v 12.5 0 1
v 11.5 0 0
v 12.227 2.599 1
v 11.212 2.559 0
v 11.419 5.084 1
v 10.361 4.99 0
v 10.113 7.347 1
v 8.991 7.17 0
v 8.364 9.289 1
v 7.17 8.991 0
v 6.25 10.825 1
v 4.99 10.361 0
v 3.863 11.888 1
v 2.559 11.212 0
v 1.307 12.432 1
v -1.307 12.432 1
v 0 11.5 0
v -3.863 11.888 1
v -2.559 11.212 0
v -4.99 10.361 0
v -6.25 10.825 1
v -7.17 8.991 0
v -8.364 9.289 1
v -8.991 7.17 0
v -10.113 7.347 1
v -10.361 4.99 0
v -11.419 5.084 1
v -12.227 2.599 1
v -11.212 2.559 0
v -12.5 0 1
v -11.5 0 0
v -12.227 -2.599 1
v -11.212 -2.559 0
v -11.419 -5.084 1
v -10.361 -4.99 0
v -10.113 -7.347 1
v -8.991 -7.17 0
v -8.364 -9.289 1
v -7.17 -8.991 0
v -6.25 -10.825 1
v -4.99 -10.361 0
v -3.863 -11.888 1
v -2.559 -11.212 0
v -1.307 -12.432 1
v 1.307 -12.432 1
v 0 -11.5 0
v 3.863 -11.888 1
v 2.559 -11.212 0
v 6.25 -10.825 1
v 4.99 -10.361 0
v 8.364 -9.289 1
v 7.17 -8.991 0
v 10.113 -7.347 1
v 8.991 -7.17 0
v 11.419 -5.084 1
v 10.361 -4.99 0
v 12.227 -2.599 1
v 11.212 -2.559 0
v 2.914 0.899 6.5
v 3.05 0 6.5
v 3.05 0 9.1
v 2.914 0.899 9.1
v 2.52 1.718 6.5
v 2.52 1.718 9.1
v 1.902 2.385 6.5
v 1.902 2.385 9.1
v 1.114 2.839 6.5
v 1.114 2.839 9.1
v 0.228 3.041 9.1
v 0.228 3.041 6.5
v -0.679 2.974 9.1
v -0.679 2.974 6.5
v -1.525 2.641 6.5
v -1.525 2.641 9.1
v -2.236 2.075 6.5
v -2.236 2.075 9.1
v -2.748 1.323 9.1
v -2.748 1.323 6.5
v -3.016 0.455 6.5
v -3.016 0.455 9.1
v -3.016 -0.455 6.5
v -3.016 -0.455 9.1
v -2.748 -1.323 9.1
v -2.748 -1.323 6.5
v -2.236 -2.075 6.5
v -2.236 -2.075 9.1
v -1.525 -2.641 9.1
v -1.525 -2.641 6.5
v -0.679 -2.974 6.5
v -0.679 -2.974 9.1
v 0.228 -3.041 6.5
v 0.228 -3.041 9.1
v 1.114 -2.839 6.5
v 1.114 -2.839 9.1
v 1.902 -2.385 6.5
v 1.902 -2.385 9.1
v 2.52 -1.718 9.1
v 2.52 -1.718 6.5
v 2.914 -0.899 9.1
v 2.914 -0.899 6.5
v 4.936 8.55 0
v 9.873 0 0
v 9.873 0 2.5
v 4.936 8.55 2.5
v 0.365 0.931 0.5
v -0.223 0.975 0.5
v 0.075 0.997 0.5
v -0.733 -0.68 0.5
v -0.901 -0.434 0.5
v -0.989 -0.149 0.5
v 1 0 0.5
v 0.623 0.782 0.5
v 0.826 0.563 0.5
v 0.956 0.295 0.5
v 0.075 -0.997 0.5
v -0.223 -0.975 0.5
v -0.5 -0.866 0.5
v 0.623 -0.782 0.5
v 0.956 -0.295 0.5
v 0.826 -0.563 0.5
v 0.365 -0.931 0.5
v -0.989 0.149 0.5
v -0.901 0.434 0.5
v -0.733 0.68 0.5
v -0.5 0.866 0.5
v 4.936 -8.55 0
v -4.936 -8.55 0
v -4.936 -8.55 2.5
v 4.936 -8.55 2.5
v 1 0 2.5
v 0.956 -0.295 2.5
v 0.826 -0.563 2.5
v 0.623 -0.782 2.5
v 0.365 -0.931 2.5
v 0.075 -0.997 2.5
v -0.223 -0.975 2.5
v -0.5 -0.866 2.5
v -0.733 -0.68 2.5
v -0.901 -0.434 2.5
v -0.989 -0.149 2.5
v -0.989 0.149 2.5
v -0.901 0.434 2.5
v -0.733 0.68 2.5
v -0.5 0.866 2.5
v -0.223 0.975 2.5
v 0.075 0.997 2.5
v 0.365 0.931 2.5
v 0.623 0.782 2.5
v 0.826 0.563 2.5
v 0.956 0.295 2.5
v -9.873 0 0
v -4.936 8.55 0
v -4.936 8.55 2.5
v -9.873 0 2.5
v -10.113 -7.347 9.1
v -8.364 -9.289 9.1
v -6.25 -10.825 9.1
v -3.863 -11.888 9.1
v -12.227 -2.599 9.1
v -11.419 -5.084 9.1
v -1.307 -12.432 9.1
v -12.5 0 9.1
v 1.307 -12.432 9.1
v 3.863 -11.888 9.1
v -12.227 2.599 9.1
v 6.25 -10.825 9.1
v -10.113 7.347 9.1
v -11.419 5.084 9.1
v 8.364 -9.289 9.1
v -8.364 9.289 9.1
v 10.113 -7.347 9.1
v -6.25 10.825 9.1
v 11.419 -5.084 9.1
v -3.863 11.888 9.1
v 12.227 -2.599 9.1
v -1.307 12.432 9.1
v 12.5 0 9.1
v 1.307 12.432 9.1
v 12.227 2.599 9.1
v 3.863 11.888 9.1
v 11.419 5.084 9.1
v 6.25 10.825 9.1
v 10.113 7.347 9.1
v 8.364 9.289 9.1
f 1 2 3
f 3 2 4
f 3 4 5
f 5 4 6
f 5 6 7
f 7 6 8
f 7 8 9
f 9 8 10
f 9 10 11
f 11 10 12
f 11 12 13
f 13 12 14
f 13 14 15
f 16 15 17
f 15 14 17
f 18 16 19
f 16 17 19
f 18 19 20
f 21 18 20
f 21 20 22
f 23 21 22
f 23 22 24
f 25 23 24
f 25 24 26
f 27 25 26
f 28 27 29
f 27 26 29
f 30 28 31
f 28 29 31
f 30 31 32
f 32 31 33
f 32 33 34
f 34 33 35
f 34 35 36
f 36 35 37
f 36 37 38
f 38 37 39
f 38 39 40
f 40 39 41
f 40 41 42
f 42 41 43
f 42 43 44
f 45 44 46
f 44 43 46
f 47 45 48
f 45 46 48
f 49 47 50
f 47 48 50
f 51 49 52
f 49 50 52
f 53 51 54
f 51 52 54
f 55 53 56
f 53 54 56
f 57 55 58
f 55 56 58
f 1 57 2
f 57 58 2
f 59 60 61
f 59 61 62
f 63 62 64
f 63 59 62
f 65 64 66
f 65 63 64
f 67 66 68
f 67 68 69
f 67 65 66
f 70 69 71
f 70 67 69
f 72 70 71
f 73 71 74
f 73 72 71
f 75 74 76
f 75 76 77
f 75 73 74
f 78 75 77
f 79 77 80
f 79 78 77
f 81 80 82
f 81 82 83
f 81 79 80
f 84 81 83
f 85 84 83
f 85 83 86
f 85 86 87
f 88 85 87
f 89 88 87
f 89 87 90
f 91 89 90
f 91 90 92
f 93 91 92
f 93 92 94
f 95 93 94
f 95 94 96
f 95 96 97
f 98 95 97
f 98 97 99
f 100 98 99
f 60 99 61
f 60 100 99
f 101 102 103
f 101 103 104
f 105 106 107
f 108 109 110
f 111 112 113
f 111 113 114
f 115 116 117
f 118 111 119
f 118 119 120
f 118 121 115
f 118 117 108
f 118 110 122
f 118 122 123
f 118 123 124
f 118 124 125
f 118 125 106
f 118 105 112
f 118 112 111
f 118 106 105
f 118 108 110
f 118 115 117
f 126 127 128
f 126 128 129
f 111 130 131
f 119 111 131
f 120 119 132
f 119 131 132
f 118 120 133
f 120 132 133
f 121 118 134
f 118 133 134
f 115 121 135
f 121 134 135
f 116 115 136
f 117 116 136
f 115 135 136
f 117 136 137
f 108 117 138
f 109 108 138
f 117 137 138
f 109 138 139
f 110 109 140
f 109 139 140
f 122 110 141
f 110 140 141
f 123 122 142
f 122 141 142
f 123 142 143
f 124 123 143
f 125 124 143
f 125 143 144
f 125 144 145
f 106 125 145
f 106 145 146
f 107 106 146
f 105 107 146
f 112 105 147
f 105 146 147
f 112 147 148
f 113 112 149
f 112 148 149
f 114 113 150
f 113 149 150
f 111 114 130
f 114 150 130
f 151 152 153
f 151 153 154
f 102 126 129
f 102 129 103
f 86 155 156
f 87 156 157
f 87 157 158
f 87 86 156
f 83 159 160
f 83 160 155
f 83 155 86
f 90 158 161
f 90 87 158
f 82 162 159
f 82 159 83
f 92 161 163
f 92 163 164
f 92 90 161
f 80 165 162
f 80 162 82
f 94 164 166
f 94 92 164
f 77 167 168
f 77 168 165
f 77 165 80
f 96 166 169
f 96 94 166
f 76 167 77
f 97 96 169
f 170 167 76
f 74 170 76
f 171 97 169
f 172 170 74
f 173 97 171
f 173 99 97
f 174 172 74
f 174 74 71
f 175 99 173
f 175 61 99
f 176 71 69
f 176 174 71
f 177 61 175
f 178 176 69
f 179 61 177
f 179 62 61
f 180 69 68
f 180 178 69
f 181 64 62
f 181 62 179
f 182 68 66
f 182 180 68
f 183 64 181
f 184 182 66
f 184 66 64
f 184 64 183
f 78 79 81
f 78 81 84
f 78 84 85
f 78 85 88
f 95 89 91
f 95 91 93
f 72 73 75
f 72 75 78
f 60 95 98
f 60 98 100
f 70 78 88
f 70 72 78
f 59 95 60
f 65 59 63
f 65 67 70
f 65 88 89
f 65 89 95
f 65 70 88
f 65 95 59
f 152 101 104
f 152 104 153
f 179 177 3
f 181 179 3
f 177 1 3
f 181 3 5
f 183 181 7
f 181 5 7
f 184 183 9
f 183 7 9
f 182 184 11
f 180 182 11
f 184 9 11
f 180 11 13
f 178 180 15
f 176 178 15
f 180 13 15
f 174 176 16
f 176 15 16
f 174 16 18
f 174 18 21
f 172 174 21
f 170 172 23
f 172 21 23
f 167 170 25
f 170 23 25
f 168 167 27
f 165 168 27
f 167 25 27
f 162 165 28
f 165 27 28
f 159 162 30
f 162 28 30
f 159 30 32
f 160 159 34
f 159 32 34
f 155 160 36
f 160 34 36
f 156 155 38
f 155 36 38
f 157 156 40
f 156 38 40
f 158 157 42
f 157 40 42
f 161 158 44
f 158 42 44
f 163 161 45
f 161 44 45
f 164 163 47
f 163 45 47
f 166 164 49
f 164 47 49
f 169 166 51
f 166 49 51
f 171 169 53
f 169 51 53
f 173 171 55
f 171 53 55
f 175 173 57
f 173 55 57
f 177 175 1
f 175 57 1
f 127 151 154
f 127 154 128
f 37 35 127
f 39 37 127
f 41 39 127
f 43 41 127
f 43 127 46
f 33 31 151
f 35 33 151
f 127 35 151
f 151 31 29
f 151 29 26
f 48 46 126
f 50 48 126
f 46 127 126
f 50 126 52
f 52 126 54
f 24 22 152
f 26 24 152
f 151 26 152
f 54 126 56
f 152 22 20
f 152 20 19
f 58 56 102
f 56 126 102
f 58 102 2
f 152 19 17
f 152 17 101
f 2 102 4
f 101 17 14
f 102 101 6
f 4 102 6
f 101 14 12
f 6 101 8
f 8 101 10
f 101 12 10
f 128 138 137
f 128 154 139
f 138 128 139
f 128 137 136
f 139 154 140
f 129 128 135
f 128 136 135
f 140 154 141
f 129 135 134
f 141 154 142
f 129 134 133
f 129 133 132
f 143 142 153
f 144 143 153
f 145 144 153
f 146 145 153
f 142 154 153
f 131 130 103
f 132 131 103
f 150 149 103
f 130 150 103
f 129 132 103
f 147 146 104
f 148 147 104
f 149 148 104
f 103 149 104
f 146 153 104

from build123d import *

# Parameters (mm, degrees)
ESQUISSE1_R        = 12.5
BOSS_EXTRU_1_DEPTH = 2.5
ESQUISSE2_R        = 12.5
BOSS_EXTRU_2_DEPTH = 4
ESQUISSE3_R        = 1
BOSS_EXTRU_3_DEPTH = 2
CHANFREIN1_SIZE    = 1
ESQUISSE4_R        = 12.5
ESQUISSE4_R_2      = 3.05
BOSS_EXTRU_4_DEPTH = 2.6


with BuildPart() as part:
    # Esquisse1 → Boss.-Extru.1 (new body)
    with BuildSketch(Plane.XY):
        Circle(ESQUISSE1_R)
        Polygon((-4.936344802, -8.55), (4.936344802, -8.55), (9.872689603, 0), (4.936344802, 8.55), (-4.936344802, 8.55), (-9.872689603, 0), align=None, mode=Mode.SUBTRACT)
    extrude(amount=BOSS_EXTRU_1_DEPTH)

    # Esquisse2 → Boss.-Extru.2 (add)
    with BuildSketch(Plane.XY.offset(2.5)):
        Circle(ESQUISSE2_R)
    extrude(amount=BOSS_EXTRU_2_DEPTH)

    # Esquisse3 → Boss.-Extru.3 (add)
    with BuildSketch(Plane(origin=(0, 0, 2.5), x_dir=(-1, 0, 0), z_dir=(0, 0, -1))):
        with Locations(Location((0, 0, 0), (0, 0, 180))):
            Circle(ESQUISSE3_R)
    extrude(amount=BOSS_EXTRU_3_DEPTH)

    # Chanfrein1
    chanfrein1_edges = [part.edges().sort_by_distance(p)[0] for p in [
        (-12.5, 0, 0),
    ]]
    chamfer(chanfrein1_edges, length=CHANFREIN1_SIZE)

    # Esquisse4 → Boss.-Extru.4 (add)
    with BuildSketch(Plane.XY.offset(6.5)):
        Circle(ESQUISSE4_R)
        Circle(ESQUISSE4_R_2, mode=Mode.SUBTRACT)
    extrude(amount=BOSS_EXTRU_4_DEPTH)


solid = part.part
